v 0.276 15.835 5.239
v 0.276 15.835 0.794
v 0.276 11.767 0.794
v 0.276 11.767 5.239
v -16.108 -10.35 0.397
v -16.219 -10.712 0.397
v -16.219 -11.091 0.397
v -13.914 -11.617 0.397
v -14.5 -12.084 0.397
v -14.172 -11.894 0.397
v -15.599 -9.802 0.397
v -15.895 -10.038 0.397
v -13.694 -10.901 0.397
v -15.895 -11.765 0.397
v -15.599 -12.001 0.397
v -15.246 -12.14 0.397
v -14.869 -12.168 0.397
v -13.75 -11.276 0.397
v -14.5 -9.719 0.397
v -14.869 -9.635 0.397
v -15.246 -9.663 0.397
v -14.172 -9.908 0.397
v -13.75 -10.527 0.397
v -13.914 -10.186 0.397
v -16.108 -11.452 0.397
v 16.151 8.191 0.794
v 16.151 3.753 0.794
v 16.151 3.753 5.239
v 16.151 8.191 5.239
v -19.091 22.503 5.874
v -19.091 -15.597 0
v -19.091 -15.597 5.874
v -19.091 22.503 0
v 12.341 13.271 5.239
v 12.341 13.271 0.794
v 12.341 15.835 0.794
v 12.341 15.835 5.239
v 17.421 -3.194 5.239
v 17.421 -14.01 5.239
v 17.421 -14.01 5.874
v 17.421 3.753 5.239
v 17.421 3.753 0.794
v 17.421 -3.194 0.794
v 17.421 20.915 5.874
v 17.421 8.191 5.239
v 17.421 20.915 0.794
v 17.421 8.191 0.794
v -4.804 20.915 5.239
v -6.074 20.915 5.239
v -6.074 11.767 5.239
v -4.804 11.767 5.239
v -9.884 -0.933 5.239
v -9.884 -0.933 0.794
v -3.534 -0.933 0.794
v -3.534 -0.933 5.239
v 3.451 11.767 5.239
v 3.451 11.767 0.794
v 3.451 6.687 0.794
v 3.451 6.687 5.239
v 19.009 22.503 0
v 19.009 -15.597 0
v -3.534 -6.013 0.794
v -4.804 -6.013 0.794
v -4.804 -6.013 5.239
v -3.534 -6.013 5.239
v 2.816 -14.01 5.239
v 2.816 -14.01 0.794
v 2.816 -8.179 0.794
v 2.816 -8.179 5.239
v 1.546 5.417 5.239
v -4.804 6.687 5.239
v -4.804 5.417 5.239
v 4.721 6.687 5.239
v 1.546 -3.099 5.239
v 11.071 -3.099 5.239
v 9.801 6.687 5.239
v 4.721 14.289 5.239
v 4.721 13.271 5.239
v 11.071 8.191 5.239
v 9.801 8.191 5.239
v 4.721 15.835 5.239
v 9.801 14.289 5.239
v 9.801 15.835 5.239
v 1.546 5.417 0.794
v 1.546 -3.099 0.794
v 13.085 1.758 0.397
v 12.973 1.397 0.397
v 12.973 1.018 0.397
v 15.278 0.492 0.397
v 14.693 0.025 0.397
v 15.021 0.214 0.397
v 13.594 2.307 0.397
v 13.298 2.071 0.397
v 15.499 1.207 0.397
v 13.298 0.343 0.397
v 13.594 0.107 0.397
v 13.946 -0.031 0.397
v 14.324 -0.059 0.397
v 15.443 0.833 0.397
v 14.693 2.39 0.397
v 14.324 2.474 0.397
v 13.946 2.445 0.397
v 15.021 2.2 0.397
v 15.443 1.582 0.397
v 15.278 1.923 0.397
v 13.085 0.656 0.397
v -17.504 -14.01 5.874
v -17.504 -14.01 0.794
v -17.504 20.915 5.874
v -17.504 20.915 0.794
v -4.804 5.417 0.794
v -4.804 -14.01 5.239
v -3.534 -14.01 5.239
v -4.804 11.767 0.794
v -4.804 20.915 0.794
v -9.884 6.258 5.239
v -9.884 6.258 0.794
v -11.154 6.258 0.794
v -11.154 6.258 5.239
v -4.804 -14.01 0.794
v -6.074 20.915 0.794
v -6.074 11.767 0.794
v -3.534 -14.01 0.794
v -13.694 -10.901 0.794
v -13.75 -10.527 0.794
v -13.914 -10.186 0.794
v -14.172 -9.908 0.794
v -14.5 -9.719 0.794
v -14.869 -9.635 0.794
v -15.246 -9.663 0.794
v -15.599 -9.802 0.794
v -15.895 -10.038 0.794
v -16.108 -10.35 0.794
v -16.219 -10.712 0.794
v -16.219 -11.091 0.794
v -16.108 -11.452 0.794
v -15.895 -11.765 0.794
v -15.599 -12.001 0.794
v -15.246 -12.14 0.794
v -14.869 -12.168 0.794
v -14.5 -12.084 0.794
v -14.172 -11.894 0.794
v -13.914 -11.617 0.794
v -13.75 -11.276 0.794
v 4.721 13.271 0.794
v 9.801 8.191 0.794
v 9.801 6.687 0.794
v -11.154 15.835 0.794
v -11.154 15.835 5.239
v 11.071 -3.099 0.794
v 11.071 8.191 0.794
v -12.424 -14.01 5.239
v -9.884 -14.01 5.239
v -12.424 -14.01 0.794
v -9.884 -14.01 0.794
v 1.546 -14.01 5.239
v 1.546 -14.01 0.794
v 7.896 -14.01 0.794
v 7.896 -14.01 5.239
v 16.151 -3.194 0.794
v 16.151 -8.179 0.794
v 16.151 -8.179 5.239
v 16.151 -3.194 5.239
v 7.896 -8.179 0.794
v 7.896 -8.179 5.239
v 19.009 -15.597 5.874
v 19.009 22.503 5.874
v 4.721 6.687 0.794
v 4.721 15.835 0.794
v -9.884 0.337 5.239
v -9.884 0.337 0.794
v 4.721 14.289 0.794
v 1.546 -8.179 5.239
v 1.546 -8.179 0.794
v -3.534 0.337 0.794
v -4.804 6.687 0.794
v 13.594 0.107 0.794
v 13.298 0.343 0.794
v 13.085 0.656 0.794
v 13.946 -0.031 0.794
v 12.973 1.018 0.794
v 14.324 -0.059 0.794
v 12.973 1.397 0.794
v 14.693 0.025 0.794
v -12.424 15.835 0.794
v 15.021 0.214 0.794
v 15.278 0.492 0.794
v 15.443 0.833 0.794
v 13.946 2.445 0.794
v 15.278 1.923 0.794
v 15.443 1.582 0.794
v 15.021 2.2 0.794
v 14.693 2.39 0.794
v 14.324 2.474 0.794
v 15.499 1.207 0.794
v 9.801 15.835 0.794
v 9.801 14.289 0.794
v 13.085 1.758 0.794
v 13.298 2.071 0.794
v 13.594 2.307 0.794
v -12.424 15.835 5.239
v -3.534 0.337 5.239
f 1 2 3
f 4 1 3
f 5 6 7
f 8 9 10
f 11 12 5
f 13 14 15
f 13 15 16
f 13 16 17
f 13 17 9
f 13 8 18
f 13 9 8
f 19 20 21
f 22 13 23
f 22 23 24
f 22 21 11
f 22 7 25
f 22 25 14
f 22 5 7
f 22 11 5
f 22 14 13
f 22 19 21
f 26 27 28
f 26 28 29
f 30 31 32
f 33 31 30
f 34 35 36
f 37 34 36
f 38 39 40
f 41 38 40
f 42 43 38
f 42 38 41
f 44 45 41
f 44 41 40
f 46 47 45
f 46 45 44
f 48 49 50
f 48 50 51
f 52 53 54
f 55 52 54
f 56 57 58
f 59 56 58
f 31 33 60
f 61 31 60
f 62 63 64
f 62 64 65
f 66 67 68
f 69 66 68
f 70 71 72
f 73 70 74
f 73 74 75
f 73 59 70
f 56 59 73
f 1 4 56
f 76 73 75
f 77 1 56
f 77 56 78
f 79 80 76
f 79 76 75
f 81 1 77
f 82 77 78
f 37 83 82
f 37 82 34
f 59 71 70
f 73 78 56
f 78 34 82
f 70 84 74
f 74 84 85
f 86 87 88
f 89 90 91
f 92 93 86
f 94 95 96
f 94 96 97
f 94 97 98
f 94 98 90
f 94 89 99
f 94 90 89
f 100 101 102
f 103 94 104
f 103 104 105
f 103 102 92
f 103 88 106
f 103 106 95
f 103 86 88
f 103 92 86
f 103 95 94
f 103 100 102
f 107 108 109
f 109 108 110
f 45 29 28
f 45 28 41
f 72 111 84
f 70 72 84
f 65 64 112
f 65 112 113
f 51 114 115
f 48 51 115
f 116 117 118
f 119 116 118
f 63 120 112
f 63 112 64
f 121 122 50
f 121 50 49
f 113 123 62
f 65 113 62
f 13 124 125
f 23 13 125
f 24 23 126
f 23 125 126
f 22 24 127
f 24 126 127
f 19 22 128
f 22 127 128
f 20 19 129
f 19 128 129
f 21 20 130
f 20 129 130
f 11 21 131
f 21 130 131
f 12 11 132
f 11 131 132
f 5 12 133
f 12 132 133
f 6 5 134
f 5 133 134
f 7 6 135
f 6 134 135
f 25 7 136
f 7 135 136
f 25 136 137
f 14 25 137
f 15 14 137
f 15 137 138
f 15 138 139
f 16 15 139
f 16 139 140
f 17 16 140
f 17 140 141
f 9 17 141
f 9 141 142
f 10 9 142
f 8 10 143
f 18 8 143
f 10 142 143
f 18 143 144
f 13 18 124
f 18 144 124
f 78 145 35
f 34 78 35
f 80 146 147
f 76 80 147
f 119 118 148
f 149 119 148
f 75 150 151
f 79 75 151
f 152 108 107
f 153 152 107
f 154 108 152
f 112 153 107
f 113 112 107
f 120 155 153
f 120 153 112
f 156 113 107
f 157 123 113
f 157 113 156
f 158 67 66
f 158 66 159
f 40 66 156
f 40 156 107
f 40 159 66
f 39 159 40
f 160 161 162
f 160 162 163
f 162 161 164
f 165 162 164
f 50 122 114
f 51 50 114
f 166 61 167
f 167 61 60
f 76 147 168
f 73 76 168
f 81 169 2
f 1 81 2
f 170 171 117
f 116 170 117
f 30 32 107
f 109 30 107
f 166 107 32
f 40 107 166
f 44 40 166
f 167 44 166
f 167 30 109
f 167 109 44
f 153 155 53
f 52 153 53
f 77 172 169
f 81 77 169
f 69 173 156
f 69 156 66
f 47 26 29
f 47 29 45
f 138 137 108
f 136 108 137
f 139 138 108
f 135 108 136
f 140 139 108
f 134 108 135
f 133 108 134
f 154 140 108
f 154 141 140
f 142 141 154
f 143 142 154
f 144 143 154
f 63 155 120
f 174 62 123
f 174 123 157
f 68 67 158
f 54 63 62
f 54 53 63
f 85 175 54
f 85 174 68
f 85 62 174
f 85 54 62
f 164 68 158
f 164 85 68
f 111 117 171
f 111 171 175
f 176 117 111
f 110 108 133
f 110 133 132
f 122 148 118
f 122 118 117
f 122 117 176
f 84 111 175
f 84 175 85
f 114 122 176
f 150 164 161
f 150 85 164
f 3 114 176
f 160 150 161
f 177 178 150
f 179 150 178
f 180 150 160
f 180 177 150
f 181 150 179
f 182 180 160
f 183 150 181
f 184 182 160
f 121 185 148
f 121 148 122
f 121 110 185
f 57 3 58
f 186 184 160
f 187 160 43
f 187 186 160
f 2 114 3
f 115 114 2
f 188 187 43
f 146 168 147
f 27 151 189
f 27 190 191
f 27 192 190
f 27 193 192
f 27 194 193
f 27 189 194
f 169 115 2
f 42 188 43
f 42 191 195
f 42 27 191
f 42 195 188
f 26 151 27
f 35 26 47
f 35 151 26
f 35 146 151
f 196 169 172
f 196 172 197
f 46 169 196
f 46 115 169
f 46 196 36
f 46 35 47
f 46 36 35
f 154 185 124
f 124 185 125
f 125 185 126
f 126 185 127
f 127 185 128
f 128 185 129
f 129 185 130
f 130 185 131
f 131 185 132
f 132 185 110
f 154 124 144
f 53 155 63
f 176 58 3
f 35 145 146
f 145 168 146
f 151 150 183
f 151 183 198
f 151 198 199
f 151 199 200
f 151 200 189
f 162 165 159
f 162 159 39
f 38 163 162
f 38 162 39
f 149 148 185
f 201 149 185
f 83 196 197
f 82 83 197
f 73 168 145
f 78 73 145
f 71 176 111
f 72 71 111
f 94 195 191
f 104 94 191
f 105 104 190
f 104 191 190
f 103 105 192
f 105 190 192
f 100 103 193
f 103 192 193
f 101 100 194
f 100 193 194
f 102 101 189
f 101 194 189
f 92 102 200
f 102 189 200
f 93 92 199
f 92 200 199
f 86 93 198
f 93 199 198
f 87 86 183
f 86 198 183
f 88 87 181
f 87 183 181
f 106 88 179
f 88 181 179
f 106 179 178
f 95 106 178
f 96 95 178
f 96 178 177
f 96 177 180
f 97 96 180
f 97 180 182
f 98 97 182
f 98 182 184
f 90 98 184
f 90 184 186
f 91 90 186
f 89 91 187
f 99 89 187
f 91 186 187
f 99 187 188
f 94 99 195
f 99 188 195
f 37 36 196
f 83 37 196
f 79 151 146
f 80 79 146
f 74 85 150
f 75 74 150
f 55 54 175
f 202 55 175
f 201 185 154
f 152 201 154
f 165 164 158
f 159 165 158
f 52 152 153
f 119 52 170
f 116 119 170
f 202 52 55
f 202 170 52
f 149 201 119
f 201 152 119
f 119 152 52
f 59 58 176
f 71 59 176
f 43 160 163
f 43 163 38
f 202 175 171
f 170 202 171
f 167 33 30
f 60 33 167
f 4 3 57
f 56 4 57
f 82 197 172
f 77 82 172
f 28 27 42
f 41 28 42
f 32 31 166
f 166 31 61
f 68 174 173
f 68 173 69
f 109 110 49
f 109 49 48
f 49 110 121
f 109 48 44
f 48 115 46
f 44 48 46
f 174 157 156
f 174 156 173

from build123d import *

# Parameters (mm, degrees)
F0_W     = 38.1
F0_H     = 38.1
F1_DEPTH = 0.79375
F2_W     = 38.1
F2_H     = 38.1
F2_W_2   = 34.925
F2_H_2   = 34.925
F3_DEPTH = 5.08
F4_W     = 1.27
F4_H     = 4.4380559438
F5_DEPTH = 4.445
F4_H_2   = 7.9962998058
F4_H_3   = 5.8306083127
F4_H_4   = 4.9851979129
F4_H_5   = 9.1487001942
F6_DEPTH = 4.445
F4_R     = 1.27
F7_DEPTH = 0.396875
F8_DEPTH = 0.396875


# Not quite as in the source:
# - a feature names something its author has since deleted; it is built from what else it names


with BuildPart() as f1:
    # F0 (on Top) → F1 (new body)
    with BuildSketch(Plane.XY):
        with Locations((-0.0411514193, 3.4528287099)):
            Rectangle(F0_W, F0_H)
    extrude(amount=F1_DEPTH)

    # F2 (on face) → F3 (join)
    with BuildSketch(Plane.XY.offset(0.79375)):
        with Locations((-0.0411514193, 3.4528287099)):
            Rectangle(F2_W, F2_H)
        with Locations((-0.0411514193, 3.4528287099)):
            Rectangle(F2_W_2, F2_H_2, mode=Mode.SUBTRACT)
    extrude(amount=F3_DEPTH)

    # F4 (on face) → F5 (join)
    with BuildSketch(Plane.XY.offset(0.79375)):
        Polygon((3.4513485807, 6.6866285157), (-4.8036514193, 6.6866285157), (-4.8036514193, 5.4166285157), (1.5463485807, 5.4166285157), (1.5463485807, -3.0990629774), (11.0713485807, -3.0990629774), (11.0713485807, 5.1481691189), (11.0713485807, 5.4166285157), (11.0713485807, 8.1909499449), (9.8013485807, 8.1909499449), (9.8013485807, 6.6866285157), (4.7213485807, 6.6866285157), (4.7213485807, 13.2709499449), (12.3413485807, 13.2709499449), (12.3413485807, 14.2892440781), (12.3413485807, 15.8353287099), (9.8013485807, 15.8353287099), (9.8013485807, 14.2892440781), (4.7213485807, 14.2892440781), (4.7213485807, 15.8353287099), (3.4513485807, 15.8353287099), (1.5463485807, 15.8353287099), (0.2763485807, 15.8353287099), (0.2763485807, 11.7666285157), (1.5463485807, 11.7666285157), (3.4513485807, 11.7666285157), align=None)
        with Locations((16.7863485807, 5.971921973)):
            Rectangle(F4_W, F4_H)
    extrude(amount=F5_DEPTH)

    # F4 (on face) → F6 (join)
    with BuildSketch(Plane.XY.offset(0.79375)):
        Polygon((-11.1536514193, 15.8353287099), (-12.4236514193, 15.8353287099), (-12.4236514193, -14.0096712901), (-9.8836514193, -14.0096712901), (-9.8836514193, -0.9333714843), (-3.5336514193, -0.9333714843), (-3.5336514193, 0.3366285157), (-9.8836514193, 0.3366285157), (-9.8836514193, 6.2576471828), (-11.1536514193, 6.2576471828), align=None)
        with Locations((-4.1686514193, -10.0115213872)):
            Rectangle(F4_W, F4_H_2)
        with Locations((2.1813485807, -11.0943671338)):
            Rectangle(F4_W, F4_H_3)
        Polygon((7.8963485807, -8.1790629774), (7.8963485807, -14.0096712901), (17.4213485807, -14.0096712901), (17.4213485807, -8.1790629774), (16.1513485807, -8.1790629774), align=None)
        with Locations((16.7863485807, -5.686464021)):
            Rectangle(F4_W, F4_H_4)
        with Locations((-5.4386514193, 16.3409786128)):
            Rectangle(F4_W, F4_H_5)
    extrude(amount=F6_DEPTH)

    # F4 (on face) → F7 (cut)
    with BuildSketch(Plane.XY.offset(0.79375)):
        with Locations((-14.9636514193, -10.9013672918)):
            Circle(F4_R)
    extrude(amount=-F7_DEPTH, mode=Mode.SUBTRACT)

    # F4 (on face) → F8 (cut)
    with BuildSketch(Plane.XY.offset(0.79375)):
        with Locations((14.2290396616, 1.2073169928)):
            Circle(F4_R)
    extrude(amount=-F8_DEPTH, mode=Mode.SUBTRACT)


solid = f1.part
